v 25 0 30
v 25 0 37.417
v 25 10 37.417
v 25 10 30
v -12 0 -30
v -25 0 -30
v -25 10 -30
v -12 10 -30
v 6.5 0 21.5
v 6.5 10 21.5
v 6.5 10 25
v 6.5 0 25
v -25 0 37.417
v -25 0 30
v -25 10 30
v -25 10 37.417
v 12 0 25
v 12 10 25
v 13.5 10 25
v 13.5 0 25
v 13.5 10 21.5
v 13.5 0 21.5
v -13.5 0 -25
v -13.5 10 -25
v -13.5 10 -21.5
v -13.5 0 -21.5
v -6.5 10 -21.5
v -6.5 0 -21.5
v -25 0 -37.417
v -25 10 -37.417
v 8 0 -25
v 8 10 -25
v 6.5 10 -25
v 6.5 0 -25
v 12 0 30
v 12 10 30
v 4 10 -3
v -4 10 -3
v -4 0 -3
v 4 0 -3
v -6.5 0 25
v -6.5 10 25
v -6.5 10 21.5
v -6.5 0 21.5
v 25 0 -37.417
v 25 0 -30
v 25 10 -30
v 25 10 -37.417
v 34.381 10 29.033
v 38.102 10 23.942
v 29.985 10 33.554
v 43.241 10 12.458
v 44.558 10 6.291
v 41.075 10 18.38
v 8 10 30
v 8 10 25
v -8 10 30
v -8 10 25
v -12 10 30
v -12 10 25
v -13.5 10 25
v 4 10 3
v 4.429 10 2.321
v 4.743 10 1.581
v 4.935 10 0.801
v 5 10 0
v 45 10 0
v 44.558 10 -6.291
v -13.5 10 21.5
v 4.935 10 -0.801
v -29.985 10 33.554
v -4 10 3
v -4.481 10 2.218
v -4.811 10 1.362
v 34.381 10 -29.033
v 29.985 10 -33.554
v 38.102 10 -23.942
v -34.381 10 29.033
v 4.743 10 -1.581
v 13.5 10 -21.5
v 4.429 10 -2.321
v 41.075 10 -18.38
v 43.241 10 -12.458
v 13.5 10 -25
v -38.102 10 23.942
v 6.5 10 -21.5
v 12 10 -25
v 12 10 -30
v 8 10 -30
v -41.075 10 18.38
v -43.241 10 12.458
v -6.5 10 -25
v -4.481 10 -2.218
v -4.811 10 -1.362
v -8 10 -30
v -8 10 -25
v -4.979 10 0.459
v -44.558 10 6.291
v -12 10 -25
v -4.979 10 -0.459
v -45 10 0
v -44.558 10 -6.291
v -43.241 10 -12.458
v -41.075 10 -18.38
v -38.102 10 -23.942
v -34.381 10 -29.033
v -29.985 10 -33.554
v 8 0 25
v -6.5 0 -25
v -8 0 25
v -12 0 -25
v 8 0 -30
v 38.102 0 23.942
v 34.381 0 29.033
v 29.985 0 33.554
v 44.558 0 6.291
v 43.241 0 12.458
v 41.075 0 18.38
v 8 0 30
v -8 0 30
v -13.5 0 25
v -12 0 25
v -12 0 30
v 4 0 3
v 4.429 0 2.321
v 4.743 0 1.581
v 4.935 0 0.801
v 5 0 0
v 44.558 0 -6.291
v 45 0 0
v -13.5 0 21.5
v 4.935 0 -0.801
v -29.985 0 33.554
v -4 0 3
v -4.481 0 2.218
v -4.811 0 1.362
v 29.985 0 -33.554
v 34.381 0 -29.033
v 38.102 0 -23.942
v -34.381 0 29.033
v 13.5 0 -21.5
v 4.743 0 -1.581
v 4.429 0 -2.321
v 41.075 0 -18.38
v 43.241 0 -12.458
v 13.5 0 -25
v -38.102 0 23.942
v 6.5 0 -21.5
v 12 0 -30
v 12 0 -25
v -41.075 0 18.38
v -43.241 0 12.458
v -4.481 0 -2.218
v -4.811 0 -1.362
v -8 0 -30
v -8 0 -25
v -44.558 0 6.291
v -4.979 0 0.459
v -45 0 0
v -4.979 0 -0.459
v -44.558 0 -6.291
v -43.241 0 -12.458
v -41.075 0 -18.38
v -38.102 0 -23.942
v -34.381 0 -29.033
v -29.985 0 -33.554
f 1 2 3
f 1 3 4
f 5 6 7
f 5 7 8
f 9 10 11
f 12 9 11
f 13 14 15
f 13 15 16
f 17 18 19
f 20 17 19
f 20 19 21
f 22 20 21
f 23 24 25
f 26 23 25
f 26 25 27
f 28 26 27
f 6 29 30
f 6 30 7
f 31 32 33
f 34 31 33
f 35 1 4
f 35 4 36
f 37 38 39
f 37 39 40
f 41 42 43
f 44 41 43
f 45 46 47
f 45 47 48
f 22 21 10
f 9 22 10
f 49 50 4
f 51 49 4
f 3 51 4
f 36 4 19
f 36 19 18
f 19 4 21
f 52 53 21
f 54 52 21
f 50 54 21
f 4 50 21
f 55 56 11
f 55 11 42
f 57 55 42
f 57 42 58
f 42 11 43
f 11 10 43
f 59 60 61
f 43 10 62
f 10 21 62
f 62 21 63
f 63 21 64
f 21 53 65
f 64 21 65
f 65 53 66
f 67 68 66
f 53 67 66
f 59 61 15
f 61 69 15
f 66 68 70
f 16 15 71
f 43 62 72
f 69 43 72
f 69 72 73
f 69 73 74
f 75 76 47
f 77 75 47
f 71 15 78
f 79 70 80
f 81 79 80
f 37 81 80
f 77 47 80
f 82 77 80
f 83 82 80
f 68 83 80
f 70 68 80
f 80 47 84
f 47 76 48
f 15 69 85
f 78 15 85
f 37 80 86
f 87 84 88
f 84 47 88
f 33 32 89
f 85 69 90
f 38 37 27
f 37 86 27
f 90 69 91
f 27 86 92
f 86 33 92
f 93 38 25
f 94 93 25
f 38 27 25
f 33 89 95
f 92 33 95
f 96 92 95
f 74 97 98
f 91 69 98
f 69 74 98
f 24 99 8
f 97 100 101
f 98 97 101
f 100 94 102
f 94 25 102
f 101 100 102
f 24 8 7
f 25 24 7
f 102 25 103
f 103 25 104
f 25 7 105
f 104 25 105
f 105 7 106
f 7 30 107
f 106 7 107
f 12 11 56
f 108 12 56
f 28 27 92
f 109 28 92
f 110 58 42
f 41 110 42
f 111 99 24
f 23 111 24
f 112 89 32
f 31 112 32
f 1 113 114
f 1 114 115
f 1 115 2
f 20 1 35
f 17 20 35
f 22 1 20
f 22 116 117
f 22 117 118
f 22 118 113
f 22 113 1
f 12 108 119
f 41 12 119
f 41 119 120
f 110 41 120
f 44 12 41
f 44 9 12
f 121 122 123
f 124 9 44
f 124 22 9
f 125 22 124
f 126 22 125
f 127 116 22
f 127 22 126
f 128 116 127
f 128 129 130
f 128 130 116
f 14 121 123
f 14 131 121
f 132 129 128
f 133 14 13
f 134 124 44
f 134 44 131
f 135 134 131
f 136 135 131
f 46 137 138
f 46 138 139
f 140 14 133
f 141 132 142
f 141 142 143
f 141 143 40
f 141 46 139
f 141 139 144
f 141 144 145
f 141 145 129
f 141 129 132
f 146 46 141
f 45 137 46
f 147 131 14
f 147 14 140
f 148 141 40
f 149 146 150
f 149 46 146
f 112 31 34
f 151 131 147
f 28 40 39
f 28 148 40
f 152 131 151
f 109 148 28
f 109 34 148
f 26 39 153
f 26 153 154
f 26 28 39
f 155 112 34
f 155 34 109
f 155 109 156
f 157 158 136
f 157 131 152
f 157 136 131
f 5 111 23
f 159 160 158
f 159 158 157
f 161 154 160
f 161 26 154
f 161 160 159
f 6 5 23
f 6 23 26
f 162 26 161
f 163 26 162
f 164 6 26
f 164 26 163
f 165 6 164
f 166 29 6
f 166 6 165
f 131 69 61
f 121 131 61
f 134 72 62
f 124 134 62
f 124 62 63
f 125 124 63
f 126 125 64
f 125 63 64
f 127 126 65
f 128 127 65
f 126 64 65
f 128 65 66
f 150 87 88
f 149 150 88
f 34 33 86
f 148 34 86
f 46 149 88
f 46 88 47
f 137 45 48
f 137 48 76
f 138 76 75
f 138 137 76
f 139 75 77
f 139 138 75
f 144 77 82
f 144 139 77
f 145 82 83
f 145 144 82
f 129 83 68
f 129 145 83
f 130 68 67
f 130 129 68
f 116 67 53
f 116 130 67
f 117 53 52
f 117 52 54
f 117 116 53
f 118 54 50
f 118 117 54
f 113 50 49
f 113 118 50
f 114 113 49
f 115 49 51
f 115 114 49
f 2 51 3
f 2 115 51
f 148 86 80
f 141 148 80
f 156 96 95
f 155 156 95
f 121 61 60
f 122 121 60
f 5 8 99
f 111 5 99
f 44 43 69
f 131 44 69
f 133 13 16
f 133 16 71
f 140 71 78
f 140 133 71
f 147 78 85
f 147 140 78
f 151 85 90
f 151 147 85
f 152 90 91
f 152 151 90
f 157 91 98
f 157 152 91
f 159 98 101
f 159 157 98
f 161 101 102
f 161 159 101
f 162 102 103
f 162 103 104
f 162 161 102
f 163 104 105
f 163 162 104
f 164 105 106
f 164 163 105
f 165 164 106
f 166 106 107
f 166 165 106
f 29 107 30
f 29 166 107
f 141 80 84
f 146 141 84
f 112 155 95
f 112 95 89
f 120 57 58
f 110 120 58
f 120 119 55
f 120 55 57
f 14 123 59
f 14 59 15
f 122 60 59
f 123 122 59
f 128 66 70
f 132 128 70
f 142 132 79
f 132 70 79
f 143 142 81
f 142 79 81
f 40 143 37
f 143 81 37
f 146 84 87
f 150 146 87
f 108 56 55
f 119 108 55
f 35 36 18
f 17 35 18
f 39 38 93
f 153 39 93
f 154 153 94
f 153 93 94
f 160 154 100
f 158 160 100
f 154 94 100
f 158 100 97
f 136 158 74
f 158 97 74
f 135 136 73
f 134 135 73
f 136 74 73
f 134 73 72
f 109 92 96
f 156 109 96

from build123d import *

# Parameters (mm, degrees)
ESTRUSIONE_ESTRUSIONE1_DEPTH = 10
SCHIZZO3_W                   = 8
SCHIZZO3_H                   = 6
TAGLIO_ESTRUSIONE2_DEPTH     = 60.371710435
TAGLIO_ESTRUSIONE3_DEPTH     = 60.371710435


with BuildPart() as part:
    # Schizzo1 → Estrusione-Estrusione1 (new body)
    with BuildSketch(Plane(origin=(0, 0, 0), x_dir=(1, 0, 0), z_dir=(0, 1, 0))):
        with BuildLine():
            Line((-25, 37.416573868), (-25, 30))
            Line((-25, 30), (25, 30))
            Line((25, 30), (25, 37.416573868))
            ThreePointArc((25, 37.416573868), (45, 0), (25, -37.416573868))
            Line((25, -37.416573868), (25, -30))
            Line((25, -30), (-25, -30))
            Line((-25, -30), (-25, -37.416573868))
            ThreePointArc((-25, -37.416573868), (-45, 0), (-25, 37.416573868))
        make_face()
    extrude(amount=ESTRUSIONE_ESTRUSIONE1_DEPTH)

    # Schizzo3 → Taglio-Estrusione2 (cut, through all)
    with BuildSketch(Plane(origin=(0, 10, 0), x_dir=(1, 0, 0), z_dir=(0, 1, 0))):
        with BuildLine():
            Line((-4, -3), (-4, 3))
            ThreePointArc((-4, 3), (-5, 0), (-4, -3))
        make_face()
        Rectangle(SCHIZZO3_W, SCHIZZO3_H)
        with BuildLine():
            ThreePointArc((5, 0), (4.74341649, 1.58113883), (4, 3))
            Line((4, 3), (4, -3))
            ThreePointArc((4, -3), (4.74341649, -1.58113883), (5, 0))
        make_face()
    extrude(amount=-TAGLIO_ESTRUSIONE2_DEPTH, mode=Mode.SUBTRACT)

    # Schizzo5 → Taglio-Estrusione3 (cut, through all)
    with BuildSketch(Plane(origin=(0, 10, 0), x_dir=(1, 0, 0), z_dir=(0, 1, 0))):
        Polygon((8, -25), (8, -28.5), (8, -30), (12, -30), (12, -27), (12, -25), (13.5, -25), (13.5, -21.5), (6.5, -21.5), (6.5, -25), align=None)
        Polygon((-13.5, 21.5), (-6.5, 21.5), (-6.5, 25), (-8, 25), (-8, 28.5), (-8, 30), (-12, 30), (-12, 28.5), (-12, 25), (-13.5, 25), align=None)
        Polygon((6.5, 21.5), (13.5, 21.5), (13.5, 25), (12, 25), (12, 27), (12, 30), (8, 30), (8, 28.5), (8, 25), (6.5, 25), align=None)
        Polygon((-8, -28.5), (-8, -25), (-6.5, -25), (-6.5, -21.5), (-13.5, -21.5), (-13.5, -25), (-12, -25), (-12, -28.5), (-12, -30), (-8, -30), align=None)
    extrude(amount=-TAGLIO_ESTRUSIONE3_DEPTH, mode=Mode.SUBTRACT)


solid = part.part
